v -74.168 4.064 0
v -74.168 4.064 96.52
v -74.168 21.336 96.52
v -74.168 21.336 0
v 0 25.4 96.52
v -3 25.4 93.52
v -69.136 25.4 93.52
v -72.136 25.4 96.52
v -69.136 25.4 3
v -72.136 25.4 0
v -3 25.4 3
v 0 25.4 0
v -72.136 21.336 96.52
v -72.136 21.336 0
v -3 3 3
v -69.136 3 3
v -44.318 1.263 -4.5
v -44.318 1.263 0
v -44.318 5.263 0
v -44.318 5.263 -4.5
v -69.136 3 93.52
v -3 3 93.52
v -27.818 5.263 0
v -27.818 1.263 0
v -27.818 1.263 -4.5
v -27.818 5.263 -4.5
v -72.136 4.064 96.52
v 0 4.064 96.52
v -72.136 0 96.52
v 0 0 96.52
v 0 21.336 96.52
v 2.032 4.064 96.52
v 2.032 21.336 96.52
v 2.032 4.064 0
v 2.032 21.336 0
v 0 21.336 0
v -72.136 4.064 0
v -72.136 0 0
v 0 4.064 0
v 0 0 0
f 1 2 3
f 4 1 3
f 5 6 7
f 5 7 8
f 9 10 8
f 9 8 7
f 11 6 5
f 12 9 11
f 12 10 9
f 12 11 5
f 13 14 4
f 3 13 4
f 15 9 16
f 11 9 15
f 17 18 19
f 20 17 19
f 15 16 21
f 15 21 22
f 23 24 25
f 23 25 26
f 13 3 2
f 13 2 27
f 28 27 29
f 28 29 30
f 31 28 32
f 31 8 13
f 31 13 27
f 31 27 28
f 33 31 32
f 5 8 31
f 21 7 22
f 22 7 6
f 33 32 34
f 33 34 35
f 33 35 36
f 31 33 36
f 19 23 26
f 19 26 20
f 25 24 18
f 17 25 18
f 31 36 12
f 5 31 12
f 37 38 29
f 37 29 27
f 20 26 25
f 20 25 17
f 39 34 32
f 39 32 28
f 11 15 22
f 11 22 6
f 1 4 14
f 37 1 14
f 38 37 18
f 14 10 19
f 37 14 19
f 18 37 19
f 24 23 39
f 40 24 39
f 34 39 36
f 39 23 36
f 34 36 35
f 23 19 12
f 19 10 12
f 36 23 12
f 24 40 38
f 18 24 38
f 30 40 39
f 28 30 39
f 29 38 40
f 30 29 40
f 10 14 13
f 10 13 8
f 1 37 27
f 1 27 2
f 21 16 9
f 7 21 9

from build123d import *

# Parameters (mm, degrees)
CROQUIS1_W              = 72.136
CROQUIS1_H              = 25.4
SALIENTE_EXTRUIR1_DEPTH = 96.52
VACIADO1_T              = -3
CROQUIS2_W              = 2.032
CROQUIS2_H              = 17.272
SALIENTE_EXTRUIR3_DEPTH = 96.52
CROQUIS4_W              = 16.5
CROQUIS4_H              = 4
SALIENTE_EXTRUIR4_DEPTH = 4.5


with BuildPart() as part:
    # Croquis1 → Saliente-Extruir1 (new body)
    with BuildSketch(Plane.XY):
        with Locations((-36.068, 12.7)):
            Rectangle(CROQUIS1_W, CROQUIS1_H)
    extrude(amount=SALIENTE_EXTRUIR1_DEPTH)

    # Vaciado1
    vaciado1_openings = [part.faces().sort_by_distance(p)[0] for p in [
        (-36.068, 25.4, 48.26),
    ]]
    offset(amount=VACIADO1_T, openings=vaciado1_openings, kind=Kind.INTERSECTION)

    # Croquis2 → Saliente-Extruir3 (add)
    with BuildSketch(Plane(origin=(0, 0, 0), x_dir=(-1, 0, 0), z_dir=(0, 0, -1))):
        with Locations((-1.016, 12.7)):
            Rectangle(CROQUIS2_W, CROQUIS2_H)
        with Locations((73.152, 12.7)):
            Rectangle(CROQUIS2_W, CROQUIS2_H)
    extrude(amount=-SALIENTE_EXTRUIR3_DEPTH)

    # Croquis4 → Saliente-Extruir4 (add)
    with BuildSketch(Plane(origin=(0, 0, 0), x_dir=(-1, 0, 0), z_dir=(0, 0, -1))):
        with Locations((36.068, 3.262624702)):
            Rectangle(CROQUIS4_W, CROQUIS4_H)
    extrude(amount=SALIENTE_EXTRUIR4_DEPTH)


solid = part.part
